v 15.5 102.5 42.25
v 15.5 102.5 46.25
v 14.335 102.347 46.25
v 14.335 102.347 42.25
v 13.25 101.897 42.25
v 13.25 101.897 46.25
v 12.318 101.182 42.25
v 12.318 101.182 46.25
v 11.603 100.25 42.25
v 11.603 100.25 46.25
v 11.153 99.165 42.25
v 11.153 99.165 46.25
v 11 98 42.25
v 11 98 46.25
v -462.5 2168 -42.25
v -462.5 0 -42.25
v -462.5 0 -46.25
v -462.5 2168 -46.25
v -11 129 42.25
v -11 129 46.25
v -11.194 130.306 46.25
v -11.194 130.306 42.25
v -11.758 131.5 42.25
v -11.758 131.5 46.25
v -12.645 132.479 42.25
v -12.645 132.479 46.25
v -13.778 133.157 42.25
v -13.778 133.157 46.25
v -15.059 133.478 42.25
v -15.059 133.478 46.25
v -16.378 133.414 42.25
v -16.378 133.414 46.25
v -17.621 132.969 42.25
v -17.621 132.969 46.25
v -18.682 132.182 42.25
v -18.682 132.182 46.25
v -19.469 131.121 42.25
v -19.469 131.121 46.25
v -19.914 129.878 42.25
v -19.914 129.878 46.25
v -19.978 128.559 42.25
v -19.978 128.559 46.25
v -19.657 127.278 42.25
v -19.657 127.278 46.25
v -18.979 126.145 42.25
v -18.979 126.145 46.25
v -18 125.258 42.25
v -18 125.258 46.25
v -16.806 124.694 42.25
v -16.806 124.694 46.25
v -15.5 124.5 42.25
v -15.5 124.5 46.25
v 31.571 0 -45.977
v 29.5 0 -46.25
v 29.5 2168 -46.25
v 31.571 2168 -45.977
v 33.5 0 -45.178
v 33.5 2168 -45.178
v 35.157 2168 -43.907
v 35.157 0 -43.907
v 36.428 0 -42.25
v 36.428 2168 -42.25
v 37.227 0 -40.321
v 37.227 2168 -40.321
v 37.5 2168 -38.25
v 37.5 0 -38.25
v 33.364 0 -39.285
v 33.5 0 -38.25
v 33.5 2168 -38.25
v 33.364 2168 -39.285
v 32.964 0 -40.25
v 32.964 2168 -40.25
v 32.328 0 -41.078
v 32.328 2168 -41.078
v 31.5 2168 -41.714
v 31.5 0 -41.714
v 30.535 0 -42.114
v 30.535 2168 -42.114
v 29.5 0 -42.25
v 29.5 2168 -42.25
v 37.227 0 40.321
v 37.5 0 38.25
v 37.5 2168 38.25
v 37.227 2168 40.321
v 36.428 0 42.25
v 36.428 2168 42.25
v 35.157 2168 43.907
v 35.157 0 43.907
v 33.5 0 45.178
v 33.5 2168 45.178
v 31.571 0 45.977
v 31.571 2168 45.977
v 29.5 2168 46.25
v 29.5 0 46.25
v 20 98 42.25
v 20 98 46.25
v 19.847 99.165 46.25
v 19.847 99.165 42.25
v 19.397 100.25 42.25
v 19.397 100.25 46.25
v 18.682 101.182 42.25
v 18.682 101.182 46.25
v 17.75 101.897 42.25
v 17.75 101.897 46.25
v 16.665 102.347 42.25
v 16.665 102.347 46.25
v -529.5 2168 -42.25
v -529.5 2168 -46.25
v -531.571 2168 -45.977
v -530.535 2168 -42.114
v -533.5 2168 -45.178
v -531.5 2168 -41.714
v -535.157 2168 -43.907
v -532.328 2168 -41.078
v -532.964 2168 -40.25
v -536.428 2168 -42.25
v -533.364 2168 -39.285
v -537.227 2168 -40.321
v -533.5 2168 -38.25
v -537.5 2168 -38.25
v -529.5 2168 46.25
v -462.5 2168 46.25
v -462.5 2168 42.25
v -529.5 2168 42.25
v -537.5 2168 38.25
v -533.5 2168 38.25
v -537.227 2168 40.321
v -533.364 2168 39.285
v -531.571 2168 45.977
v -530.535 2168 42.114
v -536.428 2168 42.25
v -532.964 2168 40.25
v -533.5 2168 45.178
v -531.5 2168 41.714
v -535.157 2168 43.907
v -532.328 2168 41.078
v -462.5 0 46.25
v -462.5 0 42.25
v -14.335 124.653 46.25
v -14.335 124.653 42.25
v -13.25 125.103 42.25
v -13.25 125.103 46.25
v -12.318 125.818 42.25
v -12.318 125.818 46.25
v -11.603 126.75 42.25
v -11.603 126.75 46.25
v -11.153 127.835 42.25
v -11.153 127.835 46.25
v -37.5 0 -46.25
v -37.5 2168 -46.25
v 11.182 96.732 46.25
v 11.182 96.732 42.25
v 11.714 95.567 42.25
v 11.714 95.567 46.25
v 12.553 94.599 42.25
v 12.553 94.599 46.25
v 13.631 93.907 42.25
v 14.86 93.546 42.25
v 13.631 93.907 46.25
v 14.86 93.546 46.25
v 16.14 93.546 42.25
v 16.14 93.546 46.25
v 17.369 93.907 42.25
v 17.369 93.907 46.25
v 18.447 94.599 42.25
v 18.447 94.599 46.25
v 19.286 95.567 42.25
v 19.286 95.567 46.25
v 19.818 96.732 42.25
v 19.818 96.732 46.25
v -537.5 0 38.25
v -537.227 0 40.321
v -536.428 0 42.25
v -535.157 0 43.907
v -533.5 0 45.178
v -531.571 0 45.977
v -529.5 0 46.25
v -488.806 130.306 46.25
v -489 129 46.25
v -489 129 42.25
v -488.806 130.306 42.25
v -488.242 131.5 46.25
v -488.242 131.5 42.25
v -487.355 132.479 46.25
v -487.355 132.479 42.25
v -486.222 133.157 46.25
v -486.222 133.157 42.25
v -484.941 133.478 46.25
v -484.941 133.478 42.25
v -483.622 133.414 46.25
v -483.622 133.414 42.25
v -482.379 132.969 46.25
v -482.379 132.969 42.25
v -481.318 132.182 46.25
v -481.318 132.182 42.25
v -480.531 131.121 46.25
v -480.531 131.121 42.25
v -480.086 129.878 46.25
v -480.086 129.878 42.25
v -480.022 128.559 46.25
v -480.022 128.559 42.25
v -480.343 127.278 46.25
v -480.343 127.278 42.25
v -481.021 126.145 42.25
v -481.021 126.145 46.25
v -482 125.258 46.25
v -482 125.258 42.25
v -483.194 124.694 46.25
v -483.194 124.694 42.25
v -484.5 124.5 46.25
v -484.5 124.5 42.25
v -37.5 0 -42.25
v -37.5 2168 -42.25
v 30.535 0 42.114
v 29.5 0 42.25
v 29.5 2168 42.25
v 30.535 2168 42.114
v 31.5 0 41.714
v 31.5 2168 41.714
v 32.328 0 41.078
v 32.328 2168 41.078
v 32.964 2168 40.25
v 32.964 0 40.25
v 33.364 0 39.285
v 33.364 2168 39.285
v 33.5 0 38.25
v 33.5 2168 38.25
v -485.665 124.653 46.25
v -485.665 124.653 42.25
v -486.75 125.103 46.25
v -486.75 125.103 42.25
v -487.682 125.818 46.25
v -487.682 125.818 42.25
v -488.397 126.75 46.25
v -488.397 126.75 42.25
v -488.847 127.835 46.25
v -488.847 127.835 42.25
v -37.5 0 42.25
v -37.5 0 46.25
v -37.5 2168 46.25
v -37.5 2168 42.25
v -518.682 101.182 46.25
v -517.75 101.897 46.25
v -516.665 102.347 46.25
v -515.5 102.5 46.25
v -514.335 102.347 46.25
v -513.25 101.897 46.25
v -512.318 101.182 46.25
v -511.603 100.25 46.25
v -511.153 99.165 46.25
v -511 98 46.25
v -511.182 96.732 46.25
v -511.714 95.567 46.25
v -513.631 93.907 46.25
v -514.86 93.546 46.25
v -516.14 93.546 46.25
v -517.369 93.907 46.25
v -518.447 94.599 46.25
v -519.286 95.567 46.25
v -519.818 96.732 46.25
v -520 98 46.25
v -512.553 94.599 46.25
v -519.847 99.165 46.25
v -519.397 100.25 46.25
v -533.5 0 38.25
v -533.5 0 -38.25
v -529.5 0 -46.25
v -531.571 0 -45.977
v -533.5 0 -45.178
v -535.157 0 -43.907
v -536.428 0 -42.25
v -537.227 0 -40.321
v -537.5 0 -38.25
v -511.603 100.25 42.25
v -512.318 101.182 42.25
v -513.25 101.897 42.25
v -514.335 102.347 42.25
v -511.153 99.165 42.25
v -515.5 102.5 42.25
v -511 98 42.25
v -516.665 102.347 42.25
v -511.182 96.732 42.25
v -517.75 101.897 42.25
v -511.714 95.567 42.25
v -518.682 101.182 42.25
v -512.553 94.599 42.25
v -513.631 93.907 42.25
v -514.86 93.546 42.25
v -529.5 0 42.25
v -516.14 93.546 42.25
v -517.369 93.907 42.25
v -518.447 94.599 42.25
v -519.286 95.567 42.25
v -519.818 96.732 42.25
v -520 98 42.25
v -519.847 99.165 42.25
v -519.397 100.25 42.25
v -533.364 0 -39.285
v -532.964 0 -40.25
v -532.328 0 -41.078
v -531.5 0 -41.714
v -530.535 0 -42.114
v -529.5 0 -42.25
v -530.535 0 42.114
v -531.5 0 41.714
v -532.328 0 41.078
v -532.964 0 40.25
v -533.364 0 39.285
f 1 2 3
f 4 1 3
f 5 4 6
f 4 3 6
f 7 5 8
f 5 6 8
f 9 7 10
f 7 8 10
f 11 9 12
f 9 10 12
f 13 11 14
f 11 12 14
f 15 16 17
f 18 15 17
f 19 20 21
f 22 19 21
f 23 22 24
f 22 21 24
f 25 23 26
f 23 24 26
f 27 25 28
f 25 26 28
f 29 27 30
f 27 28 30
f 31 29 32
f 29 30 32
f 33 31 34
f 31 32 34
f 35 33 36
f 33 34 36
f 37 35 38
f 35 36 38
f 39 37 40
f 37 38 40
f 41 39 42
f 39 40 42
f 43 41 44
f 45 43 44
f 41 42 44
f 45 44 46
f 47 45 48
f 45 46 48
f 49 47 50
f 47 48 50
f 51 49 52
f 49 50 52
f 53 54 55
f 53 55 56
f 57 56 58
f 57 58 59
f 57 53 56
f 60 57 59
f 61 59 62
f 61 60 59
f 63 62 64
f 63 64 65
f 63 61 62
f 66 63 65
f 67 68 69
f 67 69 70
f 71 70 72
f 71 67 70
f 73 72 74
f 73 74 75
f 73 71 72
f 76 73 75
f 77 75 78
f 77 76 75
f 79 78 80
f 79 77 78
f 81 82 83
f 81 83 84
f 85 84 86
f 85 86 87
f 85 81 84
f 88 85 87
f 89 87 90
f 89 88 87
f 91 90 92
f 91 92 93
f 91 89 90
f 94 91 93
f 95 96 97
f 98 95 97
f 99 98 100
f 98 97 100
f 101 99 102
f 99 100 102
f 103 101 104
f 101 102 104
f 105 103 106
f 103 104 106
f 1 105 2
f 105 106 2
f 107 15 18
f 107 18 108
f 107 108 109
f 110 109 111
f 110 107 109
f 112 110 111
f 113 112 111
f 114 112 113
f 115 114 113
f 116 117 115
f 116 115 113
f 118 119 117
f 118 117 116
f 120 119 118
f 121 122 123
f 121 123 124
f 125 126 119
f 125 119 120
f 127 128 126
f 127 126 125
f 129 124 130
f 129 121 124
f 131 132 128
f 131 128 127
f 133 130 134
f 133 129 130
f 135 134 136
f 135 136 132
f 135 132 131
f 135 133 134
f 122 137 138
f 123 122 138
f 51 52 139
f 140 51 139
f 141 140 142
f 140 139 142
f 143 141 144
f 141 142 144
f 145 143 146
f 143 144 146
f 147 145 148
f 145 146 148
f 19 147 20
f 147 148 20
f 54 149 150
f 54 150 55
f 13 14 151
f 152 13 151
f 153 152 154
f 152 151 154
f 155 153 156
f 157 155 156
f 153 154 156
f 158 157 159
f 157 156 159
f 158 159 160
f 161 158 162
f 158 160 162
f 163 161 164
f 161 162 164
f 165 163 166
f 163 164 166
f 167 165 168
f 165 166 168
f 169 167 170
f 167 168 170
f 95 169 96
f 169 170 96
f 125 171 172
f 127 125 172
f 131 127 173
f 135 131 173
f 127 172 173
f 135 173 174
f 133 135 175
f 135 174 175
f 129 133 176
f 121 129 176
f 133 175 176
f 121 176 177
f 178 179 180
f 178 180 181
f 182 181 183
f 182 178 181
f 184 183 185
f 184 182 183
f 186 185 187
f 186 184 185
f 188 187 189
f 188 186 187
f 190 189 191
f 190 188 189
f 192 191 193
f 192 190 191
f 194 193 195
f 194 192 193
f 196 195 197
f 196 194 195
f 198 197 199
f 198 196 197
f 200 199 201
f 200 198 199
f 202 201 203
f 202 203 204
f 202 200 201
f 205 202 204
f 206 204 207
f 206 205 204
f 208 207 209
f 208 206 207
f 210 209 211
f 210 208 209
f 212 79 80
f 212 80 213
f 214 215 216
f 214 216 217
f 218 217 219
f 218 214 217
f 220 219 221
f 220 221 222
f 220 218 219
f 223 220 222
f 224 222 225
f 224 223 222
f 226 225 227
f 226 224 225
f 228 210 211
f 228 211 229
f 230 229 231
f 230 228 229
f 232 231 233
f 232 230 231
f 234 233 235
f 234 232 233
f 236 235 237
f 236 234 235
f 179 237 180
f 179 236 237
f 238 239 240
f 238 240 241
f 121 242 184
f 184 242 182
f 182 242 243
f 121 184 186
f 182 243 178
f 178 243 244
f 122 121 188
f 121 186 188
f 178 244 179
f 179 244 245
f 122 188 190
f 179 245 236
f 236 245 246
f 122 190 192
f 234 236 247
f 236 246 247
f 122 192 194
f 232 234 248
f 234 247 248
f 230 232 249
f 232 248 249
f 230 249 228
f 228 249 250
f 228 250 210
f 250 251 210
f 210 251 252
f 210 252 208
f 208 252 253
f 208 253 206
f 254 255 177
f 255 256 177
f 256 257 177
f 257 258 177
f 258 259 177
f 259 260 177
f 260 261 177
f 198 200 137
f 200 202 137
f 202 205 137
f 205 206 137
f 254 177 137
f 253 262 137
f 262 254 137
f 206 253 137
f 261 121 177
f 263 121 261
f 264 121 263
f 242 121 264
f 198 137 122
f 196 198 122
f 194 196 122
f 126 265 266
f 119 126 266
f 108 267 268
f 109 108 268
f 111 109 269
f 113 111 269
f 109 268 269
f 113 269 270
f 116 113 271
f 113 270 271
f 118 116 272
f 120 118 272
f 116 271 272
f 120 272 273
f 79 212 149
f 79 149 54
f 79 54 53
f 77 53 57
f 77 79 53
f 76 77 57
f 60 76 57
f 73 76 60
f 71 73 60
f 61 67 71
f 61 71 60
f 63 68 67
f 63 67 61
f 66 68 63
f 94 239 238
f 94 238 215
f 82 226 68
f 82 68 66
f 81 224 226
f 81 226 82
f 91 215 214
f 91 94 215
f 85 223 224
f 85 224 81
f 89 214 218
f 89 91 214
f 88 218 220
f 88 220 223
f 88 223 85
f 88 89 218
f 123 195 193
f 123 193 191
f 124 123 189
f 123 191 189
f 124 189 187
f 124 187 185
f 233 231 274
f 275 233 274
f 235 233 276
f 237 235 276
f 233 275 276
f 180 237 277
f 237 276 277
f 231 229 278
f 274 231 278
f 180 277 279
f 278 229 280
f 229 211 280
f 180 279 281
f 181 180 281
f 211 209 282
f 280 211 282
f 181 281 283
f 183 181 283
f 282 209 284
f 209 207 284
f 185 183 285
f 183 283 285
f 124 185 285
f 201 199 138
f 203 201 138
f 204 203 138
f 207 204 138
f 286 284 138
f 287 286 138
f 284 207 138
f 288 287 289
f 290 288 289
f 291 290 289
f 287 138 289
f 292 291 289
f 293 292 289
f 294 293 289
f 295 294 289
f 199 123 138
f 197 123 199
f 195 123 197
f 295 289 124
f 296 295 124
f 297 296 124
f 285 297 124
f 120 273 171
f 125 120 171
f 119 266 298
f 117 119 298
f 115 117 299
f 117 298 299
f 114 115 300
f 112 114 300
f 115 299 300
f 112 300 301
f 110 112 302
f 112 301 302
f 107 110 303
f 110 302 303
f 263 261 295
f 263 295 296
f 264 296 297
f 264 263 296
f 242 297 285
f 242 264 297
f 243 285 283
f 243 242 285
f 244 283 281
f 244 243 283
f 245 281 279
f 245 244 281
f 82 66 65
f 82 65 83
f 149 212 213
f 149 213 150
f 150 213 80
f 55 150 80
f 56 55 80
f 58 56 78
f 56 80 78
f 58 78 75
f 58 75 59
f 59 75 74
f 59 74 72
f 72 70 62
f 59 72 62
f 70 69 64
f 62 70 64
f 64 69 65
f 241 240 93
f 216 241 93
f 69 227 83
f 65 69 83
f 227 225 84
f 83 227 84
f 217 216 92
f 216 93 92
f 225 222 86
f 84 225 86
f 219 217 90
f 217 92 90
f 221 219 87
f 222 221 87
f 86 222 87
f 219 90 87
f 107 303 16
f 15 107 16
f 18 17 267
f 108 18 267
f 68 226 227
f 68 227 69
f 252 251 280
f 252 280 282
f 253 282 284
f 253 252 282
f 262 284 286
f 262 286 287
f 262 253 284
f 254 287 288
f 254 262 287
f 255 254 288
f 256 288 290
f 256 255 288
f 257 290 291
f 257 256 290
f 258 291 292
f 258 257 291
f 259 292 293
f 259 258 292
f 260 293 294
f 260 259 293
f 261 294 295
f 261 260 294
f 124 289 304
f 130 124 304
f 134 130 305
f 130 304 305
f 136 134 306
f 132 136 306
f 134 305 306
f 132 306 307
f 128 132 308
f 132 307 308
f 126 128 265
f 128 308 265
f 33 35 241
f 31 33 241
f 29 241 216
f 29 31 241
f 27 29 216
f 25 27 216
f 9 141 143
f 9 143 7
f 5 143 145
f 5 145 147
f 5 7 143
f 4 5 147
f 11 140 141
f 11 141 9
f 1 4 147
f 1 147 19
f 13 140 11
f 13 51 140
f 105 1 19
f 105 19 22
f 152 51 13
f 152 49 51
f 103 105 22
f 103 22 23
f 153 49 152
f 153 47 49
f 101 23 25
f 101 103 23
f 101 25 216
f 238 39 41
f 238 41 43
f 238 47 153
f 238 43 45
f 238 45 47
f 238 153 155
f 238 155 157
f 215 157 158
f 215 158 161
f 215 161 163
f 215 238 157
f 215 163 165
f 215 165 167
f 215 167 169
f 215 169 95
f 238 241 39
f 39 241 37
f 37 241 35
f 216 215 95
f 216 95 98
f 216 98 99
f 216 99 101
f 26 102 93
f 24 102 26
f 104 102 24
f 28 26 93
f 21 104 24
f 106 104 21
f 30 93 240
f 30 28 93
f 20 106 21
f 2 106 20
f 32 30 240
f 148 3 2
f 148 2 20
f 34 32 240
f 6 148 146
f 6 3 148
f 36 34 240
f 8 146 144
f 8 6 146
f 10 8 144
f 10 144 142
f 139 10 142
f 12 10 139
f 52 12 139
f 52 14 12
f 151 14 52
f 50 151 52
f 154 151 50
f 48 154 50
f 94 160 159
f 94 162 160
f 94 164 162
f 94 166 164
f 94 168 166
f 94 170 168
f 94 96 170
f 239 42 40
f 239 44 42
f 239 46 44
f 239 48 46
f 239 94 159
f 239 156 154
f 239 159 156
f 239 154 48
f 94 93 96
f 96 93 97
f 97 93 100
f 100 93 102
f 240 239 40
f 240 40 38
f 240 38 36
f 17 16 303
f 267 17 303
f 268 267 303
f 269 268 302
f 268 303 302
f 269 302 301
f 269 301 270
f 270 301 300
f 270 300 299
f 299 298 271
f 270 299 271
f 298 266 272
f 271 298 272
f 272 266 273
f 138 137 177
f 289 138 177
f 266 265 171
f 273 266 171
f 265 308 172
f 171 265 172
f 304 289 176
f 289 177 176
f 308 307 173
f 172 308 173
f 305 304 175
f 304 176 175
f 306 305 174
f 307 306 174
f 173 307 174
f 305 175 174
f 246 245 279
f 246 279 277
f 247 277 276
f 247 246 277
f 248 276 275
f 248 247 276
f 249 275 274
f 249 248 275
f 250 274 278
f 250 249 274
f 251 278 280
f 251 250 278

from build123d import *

# Parameters (mm, degrees)
F1_DEPTH = 2168
F4_DEPTH = 4


with BuildPart() as f1:
    # F0 (on Front) → F1 (new body)
    with BuildSketch(Plane.XZ):
        with BuildLine():
            Line((-37.5, -42.25), (-37.5, -46.25))
            Line((-37.5, -46.25), (29.5, -46.25))
            ThreePointArc((29.5, -46.25), (35.1568542495, -43.9068542495), (37.5, -38.25))
            Line((37.5, -38.25), (37.5, 38.25))
            ThreePointArc((37.5, 38.25), (35.1568542495, 43.9068542495), (29.5, 46.25))
            Line((29.5, 46.25), (-37.5, 46.25))
            Line((-37.5, 46.25), (-37.5, 42.25))
            Line((-37.5, 42.25), (29.5, 42.25))
            ThreePointArc((29.5, 42.25), (32.3284271247, 41.0784271247), (33.5, 38.25))
            Line((33.5, 38.25), (33.5, -38.25))
            ThreePointArc((33.5, -38.25), (32.3284271247, -41.0784271247), (29.5, -42.25))
            Line((29.5, -42.25), (-37.5, -42.25))
        make_face()
    extrude(amount=-F1_DEPTH)

    # F3 (on offset) → F4 (cut, through all)
    with BuildSketch(Plane.XY.offset(46.25)):
        with BuildLine():
            Line((-15.5, 129), (-11, 129))
            ThreePointArc((-11, 129), (-18.6819805153, 132.1819805153), (-15.5, 124.5))
            Line((-15.5, 124.5), (-15.5, 129))
        make_face()
        with BuildLine():
            ThreePointArc((-15.5, 124.5), (-12.3180194847, 125.8180194847), (-11, 129))
            Line((-11, 129), (-15.5, 129))
            Line((-15.5, 129), (-15.5, 124.5))
        make_face()
        with BuildLine():
            ThreePointArc((15.5, 102.5), (12.3180194847, 101.1819805153), (11, 98))
            Line((11, 98), (15.5, 98))
            Line((15.5, 98), (15.5, 102.5))
        make_face()
        with BuildLine():
            Line((15.5, 98), (11, 98))
            ThreePointArc((11, 98), (15.5, 93.5), (20, 98))
            ThreePointArc((20, 98), (18.6819805153, 101.1819805153), (15.5, 102.5))
            Line((15.5, 102.5), (15.5, 98))
        make_face()
    extrude(amount=-F4_DEPTH, mode=Mode.SUBTRACT)


with BuildPart() as f6_1:
    # F6: instance of F1
    add(f1.part.mirror(Plane.YZ.offset(-250)))


solid = Compound([f1.part, f6_1.part])
